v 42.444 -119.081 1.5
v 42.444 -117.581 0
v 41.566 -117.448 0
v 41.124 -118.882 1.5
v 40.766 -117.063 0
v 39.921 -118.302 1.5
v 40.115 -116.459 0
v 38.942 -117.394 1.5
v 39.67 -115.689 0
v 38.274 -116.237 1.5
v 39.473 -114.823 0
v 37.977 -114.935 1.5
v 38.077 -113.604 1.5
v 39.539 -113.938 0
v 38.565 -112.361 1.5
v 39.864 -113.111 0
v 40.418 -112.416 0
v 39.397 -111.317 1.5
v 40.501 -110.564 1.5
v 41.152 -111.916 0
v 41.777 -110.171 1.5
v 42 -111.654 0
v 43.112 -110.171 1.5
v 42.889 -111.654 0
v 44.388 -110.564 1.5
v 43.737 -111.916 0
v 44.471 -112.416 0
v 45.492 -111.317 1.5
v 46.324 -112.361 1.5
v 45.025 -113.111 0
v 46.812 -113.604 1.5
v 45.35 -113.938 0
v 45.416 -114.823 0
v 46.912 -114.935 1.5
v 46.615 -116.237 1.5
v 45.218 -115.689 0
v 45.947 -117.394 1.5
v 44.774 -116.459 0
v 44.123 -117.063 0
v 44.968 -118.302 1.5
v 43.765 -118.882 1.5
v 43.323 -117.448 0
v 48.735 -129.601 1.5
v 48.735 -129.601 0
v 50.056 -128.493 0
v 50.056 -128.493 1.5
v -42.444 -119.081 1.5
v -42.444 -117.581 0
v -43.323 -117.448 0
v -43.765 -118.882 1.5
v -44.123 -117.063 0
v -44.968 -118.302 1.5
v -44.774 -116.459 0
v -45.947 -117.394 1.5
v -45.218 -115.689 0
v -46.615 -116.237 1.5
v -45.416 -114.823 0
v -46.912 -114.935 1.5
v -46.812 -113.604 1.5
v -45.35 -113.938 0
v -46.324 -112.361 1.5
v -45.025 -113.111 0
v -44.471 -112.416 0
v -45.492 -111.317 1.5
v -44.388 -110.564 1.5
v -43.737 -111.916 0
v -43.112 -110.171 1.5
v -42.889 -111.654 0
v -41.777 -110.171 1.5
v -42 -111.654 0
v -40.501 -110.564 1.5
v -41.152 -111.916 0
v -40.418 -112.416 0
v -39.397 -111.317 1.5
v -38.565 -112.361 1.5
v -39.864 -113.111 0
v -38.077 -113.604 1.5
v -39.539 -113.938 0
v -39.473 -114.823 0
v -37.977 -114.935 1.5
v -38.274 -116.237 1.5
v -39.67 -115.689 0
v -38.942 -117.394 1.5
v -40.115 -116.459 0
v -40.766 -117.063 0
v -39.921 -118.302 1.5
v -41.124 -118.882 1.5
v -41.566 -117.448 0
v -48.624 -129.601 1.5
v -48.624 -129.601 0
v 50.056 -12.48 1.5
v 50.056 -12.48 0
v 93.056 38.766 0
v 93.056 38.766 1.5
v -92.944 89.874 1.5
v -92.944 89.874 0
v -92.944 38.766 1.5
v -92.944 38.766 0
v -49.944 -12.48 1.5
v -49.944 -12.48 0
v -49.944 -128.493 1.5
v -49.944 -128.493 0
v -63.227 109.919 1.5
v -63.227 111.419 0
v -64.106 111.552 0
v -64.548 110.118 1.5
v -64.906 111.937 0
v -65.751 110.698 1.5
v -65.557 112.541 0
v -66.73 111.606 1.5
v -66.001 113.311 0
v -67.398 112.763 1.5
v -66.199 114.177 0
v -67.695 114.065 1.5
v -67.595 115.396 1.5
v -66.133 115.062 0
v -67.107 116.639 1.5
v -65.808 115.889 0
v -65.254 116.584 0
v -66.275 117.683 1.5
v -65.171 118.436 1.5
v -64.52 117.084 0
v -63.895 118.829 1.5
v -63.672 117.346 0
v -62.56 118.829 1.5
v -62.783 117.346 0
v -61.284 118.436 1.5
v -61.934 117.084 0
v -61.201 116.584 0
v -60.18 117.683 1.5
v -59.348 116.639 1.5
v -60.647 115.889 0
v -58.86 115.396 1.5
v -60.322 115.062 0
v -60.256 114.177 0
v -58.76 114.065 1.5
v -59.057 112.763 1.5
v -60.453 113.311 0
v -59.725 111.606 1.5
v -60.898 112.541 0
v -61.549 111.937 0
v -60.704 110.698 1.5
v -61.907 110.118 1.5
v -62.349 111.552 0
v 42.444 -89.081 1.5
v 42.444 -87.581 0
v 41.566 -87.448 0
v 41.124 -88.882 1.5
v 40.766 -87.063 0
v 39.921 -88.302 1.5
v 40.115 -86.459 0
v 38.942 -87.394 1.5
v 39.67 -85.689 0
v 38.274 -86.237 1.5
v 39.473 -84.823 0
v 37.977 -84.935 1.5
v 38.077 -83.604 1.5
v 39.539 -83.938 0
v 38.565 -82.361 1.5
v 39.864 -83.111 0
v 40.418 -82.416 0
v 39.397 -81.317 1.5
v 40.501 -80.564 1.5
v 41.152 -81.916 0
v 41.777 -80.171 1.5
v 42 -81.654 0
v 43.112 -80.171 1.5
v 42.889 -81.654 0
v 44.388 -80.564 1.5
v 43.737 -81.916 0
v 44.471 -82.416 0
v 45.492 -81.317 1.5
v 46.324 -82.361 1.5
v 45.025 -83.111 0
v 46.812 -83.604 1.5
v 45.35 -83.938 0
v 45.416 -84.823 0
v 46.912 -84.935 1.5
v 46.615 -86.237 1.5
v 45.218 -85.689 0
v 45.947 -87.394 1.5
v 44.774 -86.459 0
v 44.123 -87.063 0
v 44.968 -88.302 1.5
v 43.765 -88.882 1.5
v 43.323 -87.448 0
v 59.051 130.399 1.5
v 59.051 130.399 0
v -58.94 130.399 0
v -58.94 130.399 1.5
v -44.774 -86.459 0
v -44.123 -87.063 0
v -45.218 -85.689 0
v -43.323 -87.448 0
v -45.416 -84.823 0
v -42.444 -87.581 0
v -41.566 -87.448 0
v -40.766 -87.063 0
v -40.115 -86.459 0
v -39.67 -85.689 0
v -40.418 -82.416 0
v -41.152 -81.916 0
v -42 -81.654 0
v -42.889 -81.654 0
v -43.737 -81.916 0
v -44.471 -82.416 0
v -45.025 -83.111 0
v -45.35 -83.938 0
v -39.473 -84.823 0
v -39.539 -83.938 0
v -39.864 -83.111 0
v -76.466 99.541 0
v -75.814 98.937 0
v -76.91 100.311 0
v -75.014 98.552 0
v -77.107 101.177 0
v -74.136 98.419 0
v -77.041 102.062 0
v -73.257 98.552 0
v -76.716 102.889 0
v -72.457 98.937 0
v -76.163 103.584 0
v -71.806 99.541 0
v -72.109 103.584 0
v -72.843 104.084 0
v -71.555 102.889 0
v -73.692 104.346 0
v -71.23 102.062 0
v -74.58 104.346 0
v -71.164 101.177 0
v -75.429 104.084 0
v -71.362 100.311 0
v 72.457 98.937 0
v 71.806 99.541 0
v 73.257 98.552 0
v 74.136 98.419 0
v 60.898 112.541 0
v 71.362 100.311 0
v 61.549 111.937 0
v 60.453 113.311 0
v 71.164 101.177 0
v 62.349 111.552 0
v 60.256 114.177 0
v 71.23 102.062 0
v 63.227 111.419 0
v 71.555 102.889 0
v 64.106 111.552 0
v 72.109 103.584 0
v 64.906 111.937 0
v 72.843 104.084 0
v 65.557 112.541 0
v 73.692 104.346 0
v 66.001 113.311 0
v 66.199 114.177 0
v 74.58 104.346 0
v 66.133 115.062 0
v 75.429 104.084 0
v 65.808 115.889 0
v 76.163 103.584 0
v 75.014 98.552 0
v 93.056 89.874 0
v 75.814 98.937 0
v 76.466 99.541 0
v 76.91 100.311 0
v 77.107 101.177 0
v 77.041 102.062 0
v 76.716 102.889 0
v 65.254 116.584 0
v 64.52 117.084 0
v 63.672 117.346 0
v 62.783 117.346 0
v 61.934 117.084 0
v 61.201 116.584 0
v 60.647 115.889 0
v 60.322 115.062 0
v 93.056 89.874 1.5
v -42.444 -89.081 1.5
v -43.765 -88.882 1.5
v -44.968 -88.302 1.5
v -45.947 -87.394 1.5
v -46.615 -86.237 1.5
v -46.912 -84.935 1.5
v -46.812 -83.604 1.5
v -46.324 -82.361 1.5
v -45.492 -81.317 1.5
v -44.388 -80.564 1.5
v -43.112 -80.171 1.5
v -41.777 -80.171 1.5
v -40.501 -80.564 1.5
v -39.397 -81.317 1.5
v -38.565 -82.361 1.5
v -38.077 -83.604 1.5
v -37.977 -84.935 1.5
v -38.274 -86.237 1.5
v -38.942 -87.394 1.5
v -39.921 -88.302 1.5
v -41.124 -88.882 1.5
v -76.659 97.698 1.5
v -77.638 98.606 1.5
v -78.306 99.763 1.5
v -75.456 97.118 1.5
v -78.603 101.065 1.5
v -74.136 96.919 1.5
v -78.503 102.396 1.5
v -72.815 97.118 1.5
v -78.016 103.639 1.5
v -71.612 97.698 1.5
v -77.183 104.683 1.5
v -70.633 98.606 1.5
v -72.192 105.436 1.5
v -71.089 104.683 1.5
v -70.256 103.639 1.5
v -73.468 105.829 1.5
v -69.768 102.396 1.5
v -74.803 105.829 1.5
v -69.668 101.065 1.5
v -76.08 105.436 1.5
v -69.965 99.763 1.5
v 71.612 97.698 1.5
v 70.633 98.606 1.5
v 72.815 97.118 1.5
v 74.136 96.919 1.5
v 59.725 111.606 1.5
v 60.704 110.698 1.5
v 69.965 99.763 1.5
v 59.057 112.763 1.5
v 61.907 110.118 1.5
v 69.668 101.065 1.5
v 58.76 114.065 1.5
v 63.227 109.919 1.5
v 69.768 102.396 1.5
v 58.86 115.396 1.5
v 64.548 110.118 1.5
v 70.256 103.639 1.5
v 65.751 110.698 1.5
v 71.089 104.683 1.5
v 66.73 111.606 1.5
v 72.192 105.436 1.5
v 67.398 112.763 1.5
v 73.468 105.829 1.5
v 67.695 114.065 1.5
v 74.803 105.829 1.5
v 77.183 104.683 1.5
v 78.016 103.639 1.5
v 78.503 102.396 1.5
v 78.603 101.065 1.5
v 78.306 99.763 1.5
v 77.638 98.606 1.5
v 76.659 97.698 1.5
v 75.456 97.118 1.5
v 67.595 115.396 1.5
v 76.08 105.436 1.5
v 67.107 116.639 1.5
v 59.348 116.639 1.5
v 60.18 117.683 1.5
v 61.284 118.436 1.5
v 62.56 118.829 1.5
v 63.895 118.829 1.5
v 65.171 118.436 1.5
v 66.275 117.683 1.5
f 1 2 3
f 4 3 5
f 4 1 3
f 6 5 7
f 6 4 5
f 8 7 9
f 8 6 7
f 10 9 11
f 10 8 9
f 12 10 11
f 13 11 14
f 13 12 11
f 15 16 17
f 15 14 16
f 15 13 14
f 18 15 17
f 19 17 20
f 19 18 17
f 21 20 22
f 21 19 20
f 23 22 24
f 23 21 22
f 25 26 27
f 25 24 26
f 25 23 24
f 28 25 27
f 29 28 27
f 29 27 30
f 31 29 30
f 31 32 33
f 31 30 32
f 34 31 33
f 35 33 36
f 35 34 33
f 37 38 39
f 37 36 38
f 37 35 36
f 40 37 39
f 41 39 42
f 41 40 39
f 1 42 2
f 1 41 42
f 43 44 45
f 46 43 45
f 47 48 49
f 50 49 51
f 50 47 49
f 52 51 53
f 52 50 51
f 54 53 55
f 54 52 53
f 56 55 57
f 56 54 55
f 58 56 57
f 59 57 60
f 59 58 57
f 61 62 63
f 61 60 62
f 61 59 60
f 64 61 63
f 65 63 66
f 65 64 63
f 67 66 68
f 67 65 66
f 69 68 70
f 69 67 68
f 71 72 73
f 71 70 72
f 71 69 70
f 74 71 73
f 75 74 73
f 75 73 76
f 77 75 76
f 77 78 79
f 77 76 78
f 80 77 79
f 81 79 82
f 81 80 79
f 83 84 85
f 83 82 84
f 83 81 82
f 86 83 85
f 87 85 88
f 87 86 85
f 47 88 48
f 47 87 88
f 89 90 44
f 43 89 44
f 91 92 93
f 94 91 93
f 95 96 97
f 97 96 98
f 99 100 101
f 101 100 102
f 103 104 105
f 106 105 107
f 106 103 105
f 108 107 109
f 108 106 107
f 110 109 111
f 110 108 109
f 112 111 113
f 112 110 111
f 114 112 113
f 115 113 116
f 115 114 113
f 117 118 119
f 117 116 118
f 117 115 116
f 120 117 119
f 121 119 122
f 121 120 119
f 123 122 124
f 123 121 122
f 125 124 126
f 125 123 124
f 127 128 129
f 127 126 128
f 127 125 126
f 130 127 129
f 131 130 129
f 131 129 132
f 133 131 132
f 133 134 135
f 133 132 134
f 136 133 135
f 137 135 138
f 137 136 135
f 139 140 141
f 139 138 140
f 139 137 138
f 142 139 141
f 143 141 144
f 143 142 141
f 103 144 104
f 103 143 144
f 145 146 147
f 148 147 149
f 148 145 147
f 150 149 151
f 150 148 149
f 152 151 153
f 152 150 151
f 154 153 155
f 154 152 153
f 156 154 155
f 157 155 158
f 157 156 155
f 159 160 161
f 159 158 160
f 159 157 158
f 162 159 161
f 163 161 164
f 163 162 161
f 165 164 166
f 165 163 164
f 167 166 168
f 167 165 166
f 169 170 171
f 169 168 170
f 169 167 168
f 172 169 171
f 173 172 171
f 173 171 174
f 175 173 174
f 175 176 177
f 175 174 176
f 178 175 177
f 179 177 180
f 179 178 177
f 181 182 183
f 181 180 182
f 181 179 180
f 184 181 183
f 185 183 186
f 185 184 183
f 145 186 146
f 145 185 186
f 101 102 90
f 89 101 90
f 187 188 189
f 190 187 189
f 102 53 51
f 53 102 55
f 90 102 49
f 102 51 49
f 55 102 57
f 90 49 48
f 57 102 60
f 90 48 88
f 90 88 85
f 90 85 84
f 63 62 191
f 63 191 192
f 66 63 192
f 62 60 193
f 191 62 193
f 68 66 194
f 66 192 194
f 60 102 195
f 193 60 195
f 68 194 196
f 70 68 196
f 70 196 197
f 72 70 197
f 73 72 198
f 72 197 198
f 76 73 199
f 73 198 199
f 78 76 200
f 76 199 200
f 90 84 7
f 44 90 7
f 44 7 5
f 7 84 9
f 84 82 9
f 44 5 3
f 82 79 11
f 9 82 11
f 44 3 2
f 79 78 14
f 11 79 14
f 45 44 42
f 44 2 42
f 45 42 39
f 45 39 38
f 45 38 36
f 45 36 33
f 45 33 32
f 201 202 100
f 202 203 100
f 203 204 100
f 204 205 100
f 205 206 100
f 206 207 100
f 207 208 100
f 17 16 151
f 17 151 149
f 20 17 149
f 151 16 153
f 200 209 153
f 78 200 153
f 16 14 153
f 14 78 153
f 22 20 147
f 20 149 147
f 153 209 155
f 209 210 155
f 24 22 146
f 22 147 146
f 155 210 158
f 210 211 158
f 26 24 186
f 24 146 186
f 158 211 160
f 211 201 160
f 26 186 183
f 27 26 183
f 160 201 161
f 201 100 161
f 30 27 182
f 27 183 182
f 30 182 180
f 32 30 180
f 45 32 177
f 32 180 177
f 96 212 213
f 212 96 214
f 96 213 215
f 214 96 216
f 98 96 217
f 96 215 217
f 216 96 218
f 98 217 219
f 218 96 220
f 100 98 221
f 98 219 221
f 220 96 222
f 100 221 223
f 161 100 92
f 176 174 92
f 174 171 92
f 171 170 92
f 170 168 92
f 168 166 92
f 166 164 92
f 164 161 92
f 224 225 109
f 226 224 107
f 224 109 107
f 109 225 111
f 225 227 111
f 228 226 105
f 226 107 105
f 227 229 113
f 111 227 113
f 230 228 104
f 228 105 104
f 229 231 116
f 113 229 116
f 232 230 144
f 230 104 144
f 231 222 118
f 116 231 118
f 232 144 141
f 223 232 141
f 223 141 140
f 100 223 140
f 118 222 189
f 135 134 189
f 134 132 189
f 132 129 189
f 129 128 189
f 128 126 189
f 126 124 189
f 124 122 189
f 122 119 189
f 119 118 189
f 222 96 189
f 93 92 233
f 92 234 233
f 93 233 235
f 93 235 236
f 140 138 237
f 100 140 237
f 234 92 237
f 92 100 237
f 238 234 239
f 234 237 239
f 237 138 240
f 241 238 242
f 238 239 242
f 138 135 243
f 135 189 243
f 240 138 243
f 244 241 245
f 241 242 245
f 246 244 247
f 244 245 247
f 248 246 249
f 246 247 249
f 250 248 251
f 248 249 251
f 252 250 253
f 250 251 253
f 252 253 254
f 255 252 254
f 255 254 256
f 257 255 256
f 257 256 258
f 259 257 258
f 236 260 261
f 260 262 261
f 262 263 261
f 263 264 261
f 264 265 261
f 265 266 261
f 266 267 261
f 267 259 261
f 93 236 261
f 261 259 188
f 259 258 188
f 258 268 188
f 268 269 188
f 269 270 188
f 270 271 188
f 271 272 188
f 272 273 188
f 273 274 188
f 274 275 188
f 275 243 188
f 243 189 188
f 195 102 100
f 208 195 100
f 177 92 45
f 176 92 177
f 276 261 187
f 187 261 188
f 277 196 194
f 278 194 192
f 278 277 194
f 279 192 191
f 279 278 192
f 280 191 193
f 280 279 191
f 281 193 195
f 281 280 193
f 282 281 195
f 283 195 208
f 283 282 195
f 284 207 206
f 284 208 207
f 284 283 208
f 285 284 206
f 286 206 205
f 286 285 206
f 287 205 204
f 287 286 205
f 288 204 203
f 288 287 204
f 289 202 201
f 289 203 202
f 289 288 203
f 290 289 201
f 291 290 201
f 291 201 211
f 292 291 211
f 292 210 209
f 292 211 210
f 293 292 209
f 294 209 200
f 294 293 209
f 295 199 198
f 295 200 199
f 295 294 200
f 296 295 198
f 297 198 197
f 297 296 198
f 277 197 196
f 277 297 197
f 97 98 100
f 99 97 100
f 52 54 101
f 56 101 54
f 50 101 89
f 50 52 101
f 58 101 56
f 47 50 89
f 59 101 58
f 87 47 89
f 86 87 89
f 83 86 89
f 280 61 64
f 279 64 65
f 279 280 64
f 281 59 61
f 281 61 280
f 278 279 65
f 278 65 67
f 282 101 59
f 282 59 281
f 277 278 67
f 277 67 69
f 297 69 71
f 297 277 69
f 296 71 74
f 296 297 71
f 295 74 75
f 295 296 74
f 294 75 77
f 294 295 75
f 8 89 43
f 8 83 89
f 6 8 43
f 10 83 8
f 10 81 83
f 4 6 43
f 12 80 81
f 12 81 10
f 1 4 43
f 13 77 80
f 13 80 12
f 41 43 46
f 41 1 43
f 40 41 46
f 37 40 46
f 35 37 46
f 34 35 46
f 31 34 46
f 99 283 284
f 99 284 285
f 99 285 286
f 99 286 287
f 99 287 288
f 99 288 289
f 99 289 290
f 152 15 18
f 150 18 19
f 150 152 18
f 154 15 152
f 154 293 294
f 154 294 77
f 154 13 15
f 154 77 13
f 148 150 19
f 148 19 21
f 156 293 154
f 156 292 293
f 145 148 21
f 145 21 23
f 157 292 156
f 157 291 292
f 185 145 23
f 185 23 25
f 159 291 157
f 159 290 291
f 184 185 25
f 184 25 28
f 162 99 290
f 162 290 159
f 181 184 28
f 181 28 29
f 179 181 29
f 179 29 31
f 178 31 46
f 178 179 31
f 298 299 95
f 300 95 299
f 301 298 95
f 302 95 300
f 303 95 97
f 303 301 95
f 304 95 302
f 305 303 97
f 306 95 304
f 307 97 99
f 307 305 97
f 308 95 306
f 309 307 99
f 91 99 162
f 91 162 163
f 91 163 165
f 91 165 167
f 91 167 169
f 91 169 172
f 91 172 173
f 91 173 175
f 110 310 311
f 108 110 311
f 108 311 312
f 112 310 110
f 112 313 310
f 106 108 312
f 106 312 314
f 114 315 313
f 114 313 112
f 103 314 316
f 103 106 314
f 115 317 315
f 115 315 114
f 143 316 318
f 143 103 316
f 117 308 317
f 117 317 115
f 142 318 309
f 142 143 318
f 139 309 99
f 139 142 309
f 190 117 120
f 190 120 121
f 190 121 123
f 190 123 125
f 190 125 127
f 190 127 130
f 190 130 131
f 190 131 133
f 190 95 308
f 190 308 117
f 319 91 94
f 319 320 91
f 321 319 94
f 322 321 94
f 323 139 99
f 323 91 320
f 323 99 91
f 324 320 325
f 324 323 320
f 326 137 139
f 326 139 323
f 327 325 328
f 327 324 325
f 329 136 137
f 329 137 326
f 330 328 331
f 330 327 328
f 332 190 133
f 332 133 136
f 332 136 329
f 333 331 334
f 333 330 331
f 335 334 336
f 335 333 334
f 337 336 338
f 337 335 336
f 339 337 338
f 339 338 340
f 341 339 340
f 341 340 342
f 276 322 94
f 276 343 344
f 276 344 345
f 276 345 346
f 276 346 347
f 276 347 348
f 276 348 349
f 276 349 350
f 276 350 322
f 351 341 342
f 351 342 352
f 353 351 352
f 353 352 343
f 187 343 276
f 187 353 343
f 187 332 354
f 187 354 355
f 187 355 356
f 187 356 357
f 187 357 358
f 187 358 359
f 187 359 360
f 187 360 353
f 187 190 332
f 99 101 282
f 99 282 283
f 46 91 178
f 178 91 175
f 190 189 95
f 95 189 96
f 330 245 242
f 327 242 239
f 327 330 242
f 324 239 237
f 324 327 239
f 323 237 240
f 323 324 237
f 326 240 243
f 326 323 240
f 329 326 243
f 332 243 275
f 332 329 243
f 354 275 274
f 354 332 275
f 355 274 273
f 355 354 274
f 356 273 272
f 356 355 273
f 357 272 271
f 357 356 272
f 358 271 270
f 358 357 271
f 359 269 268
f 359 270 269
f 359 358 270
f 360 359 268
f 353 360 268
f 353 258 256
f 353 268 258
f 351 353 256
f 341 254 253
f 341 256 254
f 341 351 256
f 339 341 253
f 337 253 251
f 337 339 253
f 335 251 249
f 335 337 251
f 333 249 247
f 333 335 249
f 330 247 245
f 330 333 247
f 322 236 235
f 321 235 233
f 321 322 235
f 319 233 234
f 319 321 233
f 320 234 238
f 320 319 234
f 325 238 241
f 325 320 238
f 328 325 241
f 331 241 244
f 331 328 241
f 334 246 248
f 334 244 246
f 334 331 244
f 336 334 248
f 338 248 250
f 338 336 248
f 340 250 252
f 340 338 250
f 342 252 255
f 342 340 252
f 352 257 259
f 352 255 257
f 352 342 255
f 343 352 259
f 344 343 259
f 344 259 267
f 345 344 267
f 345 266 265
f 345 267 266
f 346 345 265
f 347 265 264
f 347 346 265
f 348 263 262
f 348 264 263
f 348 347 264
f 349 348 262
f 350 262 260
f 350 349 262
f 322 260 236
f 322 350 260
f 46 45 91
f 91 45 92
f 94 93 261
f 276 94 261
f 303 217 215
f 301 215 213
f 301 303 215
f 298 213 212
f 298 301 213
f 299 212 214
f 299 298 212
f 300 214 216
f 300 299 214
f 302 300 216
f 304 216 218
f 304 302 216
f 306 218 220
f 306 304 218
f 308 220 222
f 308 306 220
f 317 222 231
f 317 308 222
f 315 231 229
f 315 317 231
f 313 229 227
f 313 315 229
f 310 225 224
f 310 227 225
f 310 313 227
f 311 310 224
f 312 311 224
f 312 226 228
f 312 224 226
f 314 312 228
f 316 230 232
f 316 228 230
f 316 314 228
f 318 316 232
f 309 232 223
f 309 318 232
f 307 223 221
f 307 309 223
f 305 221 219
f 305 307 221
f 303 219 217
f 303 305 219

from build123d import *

# Parameters (mm, degrees)
RESSALTO_EXTRUS_O1_DEPTH                     = 1.5
ESCAREADO_PARA_PARAFUSO_ALLEN_SEXTAV_2_COUNT = 2
ESCAREADO_PARA_PARAFUSO_ALLEN_SEXTAV_2_PITCH = 16.970294761
ESCAREADO_PARA_PARAFUSO_ALLEN_SEXTAV_3_COUNT = 2
ESCAREADO_PARA_PARAFUSO_ALLEN_SEXTAV_3_PITCH = 126.454837383
ESCAREADO_PARA_PARAFUSO_ALLEN_SEXTAV_4_COUNT = 2
ESCAREADO_PARA_PARAFUSO_ALLEN_SEXTAV_4_PITCH = 137.976919064
ESCAREADO_PARA_PARAFUSO_ALLEN_SEXTAV_5_COUNT = 2
ESCAREADO_PARA_PARAFUSO_ALLEN_SEXTAV_5_PITCH = 225.316554427
ESCAREADO_PARA_PARAFUSO_ALLEN_SEXTAV_6_COUNT = 2
ESCAREADO_PARA_PARAFUSO_ALLEN_SEXTAV_6_PITCH = 252.205372066
ESCAREADO_PARA_PARAFUSO_ALLEN_SEXTAV_7_COUNT = 2
ESCAREADO_PARA_PARAFUSO_ALLEN_SEXTAV_7_PITCH = 229.941146022
ESCAREADO_PARA_PARAFUSO_ALLEN_SEXTAV_8_COUNT = 2
ESCAREADO_PARA_PARAFUSO_ALLEN_SEXTAV_8_PITCH = 200.082309648


with BuildPart() as part:
    # Esboço1 → Ressalto-extrusão1 (new body)
    with BuildSketch(Plane.XY):
        Polygon((59.050720106, 130.399321825), (-58.939675618, 130.399321825), (-92.944477756, 89.873976712), (-92.944477756, 38.765530101), (-49.944477756, -12.47987438), (-49.944477756, -128.492963544), (-48.624354865, -129.600678175), (48.735399354, -129.600678175), (50.055522244, -128.492963544), (50.055522244, -12.47987438), (93.055522244, 38.765530101), (93.055522244, 89.873976712), align=None)
    extrude(amount=RESSALTO_EXTRUS_O1_DEPTH)

    # Esboço4 → Escareado para parafuso Allen sextavado escareado de M41 (revolve, cut)
    with BuildSketch(Plane(origin=(-63.227418691, 114.399321825, 1.5), x_dir=(0, -1, 0), z_dir=(1, 0, 0))):
        Polygon((0, 0), (0, 1.5), (2.25, 1.5), (2.25, 2.23), (4.48, 0), align=None)
    escareado_para_parafuso_allen_sextavado = revolve(axis=Axis((-63.227418691, 114.399321825, 7.85), (0, 0, -1)), mode=Mode.SUBTRACT)

    # Escareado para parafuso Allen sextav 2: Escareado para parafuso Allen sextavado escareado de M41 ×2
    with Locations(*[Vector(-0.64278761, -0.766044443, 0) * (i * ESCAREADO_PARA_PARAFUSO_ALLEN_SEXTAV_2_PITCH) for i in range(1, ESCAREADO_PARA_PARAFUSO_ALLEN_SEXTAV_2_COUNT)]):
        add(escareado_para_parafuso_allen_sextavado, mode=Mode.SUBTRACT)

    # Escareado para parafuso Allen sextav 3: Escareado para parafuso Allen sextavado escareado de M41 ×2
    with Locations(*[(i * ESCAREADO_PARA_PARAFUSO_ALLEN_SEXTAV_3_PITCH, 0, 0) for i in range(1, ESCAREADO_PARA_PARAFUSO_ALLEN_SEXTAV_3_COUNT)]):
        add(escareado_para_parafuso_allen_sextavado, mode=Mode.SUBTRACT)

    # Escareado para parafuso Allen sextav 4: Escareado para parafuso Allen sextavado escareado de M41 ×2
    with Locations(*[Vector(0.995551528, -0.094218657, 0) * (i * ESCAREADO_PARA_PARAFUSO_ALLEN_SEXTAV_4_PITCH) for i in range(1, ESCAREADO_PARA_PARAFUSO_ALLEN_SEXTAV_4_COUNT)]):
        add(escareado_para_parafuso_allen_sextavado, mode=Mode.SUBTRACT)

    # Escareado para parafuso Allen sextav 5: Escareado para parafuso Allen sextavado escareado de M41 ×2
    with Locations(*[Vector(0.468993043, -0.88320186, 0) * (i * ESCAREADO_PARA_PARAFUSO_ALLEN_SEXTAV_5_PITCH) for i in range(1, ESCAREADO_PARA_PARAFUSO_ALLEN_SEXTAV_5_COUNT)]):
        add(escareado_para_parafuso_allen_sextavado, mode=Mode.SUBTRACT)

    # Escareado para parafuso Allen sextav 6: Escareado para parafuso Allen sextavado escareado de M41 ×2
    with Locations(*[Vector(0.418991458, -0.907990175, 0) * (i * ESCAREADO_PARA_PARAFUSO_ALLEN_SEXTAV_6_PITCH) for i in range(1, ESCAREADO_PARA_PARAFUSO_ALLEN_SEXTAV_6_COUNT)]):
        add(escareado_para_parafuso_allen_sextavado, mode=Mode.SUBTRACT)

    # Escareado para parafuso Allen sextav 7: Escareado para parafuso Allen sextavado escareado de M41 ×2
    with Locations(*[Vector(0.090383741, -0.995907013, 0) * (i * ESCAREADO_PARA_PARAFUSO_ALLEN_SEXTAV_7_PITCH) for i in range(1, ESCAREADO_PARA_PARAFUSO_ALLEN_SEXTAV_7_COUNT)]):
        add(escareado_para_parafuso_allen_sextavado, mode=Mode.SUBTRACT)

    # Escareado para parafuso Allen sextav 8: Escareado para parafuso Allen sextavado escareado de M41 ×2
    with Locations(*[Vector(0.103871956, -0.994590678, 0) * (i * ESCAREADO_PARA_PARAFUSO_ALLEN_SEXTAV_8_PITCH) for i in range(1, ESCAREADO_PARA_PARAFUSO_ALLEN_SEXTAV_8_COUNT)]):
        add(escareado_para_parafuso_allen_sextavado, mode=Mode.SUBTRACT)


solid = part.part
